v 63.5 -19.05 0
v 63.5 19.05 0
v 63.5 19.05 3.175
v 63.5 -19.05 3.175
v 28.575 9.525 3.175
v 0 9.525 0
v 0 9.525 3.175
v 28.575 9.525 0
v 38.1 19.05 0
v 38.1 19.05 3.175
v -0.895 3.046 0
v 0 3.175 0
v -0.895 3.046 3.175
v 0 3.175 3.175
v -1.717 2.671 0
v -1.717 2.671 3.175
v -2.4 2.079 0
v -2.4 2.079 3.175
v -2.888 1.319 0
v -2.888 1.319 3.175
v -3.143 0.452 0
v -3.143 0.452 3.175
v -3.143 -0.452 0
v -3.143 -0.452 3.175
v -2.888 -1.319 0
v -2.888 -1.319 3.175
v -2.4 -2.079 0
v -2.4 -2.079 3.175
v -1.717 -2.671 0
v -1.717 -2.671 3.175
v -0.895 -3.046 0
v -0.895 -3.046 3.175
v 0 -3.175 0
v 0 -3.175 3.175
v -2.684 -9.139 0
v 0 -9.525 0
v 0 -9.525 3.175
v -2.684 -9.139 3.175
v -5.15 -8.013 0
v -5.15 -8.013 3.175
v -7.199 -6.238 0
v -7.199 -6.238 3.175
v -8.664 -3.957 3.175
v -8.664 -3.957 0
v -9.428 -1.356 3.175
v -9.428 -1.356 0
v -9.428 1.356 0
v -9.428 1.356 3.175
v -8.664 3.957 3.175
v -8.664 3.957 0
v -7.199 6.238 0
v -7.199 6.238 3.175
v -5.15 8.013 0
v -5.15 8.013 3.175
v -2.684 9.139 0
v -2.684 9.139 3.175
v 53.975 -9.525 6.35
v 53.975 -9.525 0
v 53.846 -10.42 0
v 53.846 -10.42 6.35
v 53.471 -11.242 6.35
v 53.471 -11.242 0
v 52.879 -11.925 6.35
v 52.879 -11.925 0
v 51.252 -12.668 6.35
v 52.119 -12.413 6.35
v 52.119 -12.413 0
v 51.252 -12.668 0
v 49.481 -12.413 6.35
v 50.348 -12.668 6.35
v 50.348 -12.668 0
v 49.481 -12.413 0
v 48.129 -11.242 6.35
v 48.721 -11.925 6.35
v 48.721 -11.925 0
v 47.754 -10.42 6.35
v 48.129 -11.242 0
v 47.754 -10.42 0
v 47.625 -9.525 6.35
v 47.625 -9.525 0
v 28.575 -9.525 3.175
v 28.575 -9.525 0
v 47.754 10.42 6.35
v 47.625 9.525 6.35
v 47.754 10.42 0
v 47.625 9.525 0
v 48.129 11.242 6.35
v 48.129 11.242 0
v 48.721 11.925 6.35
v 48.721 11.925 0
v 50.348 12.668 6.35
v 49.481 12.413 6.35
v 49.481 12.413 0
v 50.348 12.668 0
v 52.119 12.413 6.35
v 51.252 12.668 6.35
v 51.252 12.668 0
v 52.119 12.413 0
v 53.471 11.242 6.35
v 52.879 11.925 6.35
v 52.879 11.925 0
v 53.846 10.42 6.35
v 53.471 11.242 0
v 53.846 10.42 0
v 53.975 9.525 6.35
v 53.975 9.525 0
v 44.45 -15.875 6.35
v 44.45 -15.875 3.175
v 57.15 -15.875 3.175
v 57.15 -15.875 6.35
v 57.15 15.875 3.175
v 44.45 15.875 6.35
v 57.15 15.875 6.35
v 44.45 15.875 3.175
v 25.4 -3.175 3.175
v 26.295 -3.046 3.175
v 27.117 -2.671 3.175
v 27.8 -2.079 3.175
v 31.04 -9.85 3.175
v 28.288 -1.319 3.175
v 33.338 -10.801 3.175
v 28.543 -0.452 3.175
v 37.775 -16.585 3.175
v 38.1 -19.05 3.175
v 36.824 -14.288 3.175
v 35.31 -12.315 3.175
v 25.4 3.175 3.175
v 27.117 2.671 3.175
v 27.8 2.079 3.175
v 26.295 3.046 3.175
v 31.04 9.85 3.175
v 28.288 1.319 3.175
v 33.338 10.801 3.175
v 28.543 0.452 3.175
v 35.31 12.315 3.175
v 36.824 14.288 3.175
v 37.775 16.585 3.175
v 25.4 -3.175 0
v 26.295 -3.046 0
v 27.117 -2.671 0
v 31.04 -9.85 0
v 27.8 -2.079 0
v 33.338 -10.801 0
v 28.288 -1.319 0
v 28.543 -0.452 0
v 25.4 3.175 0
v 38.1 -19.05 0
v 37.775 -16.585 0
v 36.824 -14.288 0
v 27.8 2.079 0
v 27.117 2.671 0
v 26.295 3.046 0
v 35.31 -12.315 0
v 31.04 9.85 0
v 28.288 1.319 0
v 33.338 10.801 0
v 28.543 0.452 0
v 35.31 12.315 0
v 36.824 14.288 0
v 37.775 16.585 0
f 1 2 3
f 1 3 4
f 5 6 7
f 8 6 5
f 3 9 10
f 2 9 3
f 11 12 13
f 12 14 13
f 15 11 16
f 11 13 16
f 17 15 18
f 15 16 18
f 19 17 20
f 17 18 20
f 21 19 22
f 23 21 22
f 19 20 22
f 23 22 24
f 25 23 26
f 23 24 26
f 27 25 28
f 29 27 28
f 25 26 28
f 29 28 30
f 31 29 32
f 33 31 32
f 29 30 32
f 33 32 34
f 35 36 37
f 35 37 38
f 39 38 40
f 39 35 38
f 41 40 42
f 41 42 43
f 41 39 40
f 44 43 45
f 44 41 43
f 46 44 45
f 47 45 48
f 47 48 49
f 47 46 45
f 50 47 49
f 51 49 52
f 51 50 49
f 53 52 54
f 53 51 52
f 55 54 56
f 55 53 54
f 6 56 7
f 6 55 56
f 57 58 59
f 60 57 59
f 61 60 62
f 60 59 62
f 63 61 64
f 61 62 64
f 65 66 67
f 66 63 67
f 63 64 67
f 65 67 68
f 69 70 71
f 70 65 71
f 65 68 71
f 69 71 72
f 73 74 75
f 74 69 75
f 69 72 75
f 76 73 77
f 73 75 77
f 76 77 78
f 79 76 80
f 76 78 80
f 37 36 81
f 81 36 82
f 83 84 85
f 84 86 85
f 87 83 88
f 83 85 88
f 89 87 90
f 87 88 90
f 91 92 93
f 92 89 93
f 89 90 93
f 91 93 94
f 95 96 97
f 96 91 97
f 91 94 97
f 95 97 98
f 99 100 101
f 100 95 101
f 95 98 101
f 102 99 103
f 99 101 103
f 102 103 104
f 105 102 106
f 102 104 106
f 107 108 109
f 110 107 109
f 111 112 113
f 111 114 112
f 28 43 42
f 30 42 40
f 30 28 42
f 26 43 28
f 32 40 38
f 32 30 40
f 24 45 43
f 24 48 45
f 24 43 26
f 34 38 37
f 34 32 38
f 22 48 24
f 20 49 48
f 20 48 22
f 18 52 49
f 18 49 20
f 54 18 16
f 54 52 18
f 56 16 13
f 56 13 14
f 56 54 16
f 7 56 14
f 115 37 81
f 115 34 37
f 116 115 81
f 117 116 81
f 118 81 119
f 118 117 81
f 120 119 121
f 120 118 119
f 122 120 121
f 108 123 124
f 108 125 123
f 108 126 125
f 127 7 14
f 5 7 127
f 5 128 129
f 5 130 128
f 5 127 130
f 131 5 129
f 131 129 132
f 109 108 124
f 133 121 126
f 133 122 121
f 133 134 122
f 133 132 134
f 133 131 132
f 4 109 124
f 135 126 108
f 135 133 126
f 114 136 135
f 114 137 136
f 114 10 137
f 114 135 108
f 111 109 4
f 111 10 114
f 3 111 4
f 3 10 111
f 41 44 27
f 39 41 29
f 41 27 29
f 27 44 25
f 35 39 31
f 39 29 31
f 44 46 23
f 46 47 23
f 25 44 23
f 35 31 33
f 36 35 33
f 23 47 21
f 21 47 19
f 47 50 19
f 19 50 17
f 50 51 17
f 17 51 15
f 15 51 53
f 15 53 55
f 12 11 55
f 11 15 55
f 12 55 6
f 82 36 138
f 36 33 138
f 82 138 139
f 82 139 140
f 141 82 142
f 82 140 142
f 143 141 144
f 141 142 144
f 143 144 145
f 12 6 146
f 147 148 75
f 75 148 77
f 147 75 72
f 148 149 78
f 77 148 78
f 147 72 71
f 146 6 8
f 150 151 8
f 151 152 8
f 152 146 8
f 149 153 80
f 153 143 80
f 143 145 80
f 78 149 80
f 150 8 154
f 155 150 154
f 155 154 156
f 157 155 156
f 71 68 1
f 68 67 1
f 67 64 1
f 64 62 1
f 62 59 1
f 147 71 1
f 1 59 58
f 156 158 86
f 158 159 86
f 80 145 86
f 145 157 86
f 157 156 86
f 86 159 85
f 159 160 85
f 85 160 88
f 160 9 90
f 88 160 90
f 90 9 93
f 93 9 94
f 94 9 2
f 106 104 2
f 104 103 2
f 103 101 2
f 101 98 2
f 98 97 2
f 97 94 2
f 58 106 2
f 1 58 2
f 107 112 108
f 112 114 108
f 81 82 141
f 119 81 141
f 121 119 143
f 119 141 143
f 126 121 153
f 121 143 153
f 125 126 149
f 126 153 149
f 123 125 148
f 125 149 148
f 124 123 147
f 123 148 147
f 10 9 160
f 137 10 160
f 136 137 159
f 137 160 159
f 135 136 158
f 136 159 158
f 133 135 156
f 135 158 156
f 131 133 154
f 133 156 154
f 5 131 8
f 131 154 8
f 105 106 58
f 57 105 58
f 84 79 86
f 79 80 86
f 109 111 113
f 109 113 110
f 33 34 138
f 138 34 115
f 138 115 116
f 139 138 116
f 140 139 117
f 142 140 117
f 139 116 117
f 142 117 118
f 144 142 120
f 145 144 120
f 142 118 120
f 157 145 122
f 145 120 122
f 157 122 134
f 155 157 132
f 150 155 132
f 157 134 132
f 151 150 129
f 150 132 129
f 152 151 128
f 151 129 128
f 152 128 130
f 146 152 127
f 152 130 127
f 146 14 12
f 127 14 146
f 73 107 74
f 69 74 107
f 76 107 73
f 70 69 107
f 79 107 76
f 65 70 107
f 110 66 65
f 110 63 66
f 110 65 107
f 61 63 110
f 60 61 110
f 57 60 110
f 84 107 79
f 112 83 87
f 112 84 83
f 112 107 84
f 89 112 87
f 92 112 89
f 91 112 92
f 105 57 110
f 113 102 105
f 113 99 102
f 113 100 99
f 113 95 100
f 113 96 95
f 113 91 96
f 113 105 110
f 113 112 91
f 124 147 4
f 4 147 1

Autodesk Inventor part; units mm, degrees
ref_plane "YZ Plane" through (0, 0, 0) normal (1, 0, 0) x (0, 1, 0)
ref_plane "XZ Plane" through (0, 0, 0) normal (0, 1, 0) x (-1, 0, 0)
ref_plane "XY Plane" through (0, 0, 0) normal (0, 0, 1) x (1, 0, 0)
sketch "Sketch1" plane through (0, 0, 0) normal (0, 0, 1) x (1, 0, 0)
  line L0 (0, -3.175) -> (25.4, -3.175)
  arc A0 (25.4, -3.175) -> (25.4, 3.175) centre (25.4, 0) ccw
  line L1 (25.4, 3.175) -> (0, 3.175)
  arc A1 (0, 3.175) -> (0, -3.175) centre (0, 0) ccw
  arc A2 (0, 9.525) -> (0, -9.525) centre (0, 0) ccw
  line L2 (0, 9.525) -> (28.575, 9.525)
  line L3 (0, -9.525) -> (28.575, -9.525)
  arc A3 (28.575, 9.525) -> (38.1, 19.05) centre (28.575, 19.05) ccw
  arc A4 (38.1, -19.05) -> (28.575, -9.525) centre (28.575, -19.05) ccw
  line L4 (38.1, -19.05) -> (63.5, -19.05)
  line L5 (38.1, 19.05) -> (63.5, 19.05)
  line L6 (44.45, 15.875) -> (57.15, 15.875)
  line L7 (53.975, 9.525) -> (53.975, -9.525)
  line L8 (47.625, -9.525) -> (47.625, 9.525)
  arc A5 (53.975, 9.525) -> (47.625, 9.525) centre (50.8, 9.525) ccw
  line L9 (44.45, 15.875) -> (44.45, -15.875)
  line L10 (44.45, -15.875) -> (57.15, -15.875)
  line L11 (57.15, 15.875) -> (57.15, -15.875)
  arc A6 (47.625, -9.525) -> (53.975, -9.525) centre (50.8, -9.525) ccw
  line L12 (-24.13, 0) -> (78.105, 0) projected
  line L13 (0, -26.67) -> (0, 26.67) projected
  line L14 (63.5, 19.05) -> (63.5, -19.05)
  point P0 (0, 0)
  point P1 (50.8, 12.7)
  point P2 (50.8, 15.875)
  point P3 (50.8, 19.05)
  point P4 (50.8, -19.05)
  point P5 (63.5, 0)
  point P6 (47.625, 0)
  point P7 (53.975, 0)
  point P8 (44.45, 0)
  point P9 (57.15, 0)
  dimension "d25" = 63.5
  dimension "d26" = 25.4
  dimension "d27" = 6.35
  dimension "d28" = 12.7
  dimension "d29" = 3.175
  dimension "d30" = 9.525
  dimension "d31" = 3.175
  dimension "d32" = 25.4
  dimension "d33" = 38.1
  dimension "d34" = 3.175
  dimension "d35" = 19.05
  dimension "d36" = 31.75
extrude "Extrusion1" add sketch "Sketch1" along normal blind 3.175 contours L13 L12 A0 L0 | L13 A2 L12 A1 | L0 A0 L12 L9 L10 L11 L14 L4 A4 L3 L13 | A1 L12 L13 | L12 A2 L13 A1 | A1 L13 L12 | L13 L1 A0 L12 | A0 L1 L13 L2 A3 L5 L14 L12 L11 L6 L9
extrude "Extrusion2" add sketch "Sketch1" along normal blind 6.35 contours L12 L8 A6 L7 L11 L10 L9 | L9 L6 L11 L12 L7 A5 L8
sketch "Sketch2" plane through (0, 0, 3.175) normal (0, 0, 1) x (1, 0, 0)
  circle A0 centre (0, 0) radius 3.175
  line L0 (0, 3.175) -> (25.4, 3.175)
  circle A1 centre (25.4, 0) radius 3.175
  line L1 (0, -3.175) -> (25.4, -3.175)
  line L2 (-24.13, 0) -> (78.105, 0) projected
  dimension "d37" = 6.35
  dimension "d38" = 25.4
extrude "Extrusion3" cut sketch "Sketch2" against normal through all
properties part number "Ch3 Part 1"
